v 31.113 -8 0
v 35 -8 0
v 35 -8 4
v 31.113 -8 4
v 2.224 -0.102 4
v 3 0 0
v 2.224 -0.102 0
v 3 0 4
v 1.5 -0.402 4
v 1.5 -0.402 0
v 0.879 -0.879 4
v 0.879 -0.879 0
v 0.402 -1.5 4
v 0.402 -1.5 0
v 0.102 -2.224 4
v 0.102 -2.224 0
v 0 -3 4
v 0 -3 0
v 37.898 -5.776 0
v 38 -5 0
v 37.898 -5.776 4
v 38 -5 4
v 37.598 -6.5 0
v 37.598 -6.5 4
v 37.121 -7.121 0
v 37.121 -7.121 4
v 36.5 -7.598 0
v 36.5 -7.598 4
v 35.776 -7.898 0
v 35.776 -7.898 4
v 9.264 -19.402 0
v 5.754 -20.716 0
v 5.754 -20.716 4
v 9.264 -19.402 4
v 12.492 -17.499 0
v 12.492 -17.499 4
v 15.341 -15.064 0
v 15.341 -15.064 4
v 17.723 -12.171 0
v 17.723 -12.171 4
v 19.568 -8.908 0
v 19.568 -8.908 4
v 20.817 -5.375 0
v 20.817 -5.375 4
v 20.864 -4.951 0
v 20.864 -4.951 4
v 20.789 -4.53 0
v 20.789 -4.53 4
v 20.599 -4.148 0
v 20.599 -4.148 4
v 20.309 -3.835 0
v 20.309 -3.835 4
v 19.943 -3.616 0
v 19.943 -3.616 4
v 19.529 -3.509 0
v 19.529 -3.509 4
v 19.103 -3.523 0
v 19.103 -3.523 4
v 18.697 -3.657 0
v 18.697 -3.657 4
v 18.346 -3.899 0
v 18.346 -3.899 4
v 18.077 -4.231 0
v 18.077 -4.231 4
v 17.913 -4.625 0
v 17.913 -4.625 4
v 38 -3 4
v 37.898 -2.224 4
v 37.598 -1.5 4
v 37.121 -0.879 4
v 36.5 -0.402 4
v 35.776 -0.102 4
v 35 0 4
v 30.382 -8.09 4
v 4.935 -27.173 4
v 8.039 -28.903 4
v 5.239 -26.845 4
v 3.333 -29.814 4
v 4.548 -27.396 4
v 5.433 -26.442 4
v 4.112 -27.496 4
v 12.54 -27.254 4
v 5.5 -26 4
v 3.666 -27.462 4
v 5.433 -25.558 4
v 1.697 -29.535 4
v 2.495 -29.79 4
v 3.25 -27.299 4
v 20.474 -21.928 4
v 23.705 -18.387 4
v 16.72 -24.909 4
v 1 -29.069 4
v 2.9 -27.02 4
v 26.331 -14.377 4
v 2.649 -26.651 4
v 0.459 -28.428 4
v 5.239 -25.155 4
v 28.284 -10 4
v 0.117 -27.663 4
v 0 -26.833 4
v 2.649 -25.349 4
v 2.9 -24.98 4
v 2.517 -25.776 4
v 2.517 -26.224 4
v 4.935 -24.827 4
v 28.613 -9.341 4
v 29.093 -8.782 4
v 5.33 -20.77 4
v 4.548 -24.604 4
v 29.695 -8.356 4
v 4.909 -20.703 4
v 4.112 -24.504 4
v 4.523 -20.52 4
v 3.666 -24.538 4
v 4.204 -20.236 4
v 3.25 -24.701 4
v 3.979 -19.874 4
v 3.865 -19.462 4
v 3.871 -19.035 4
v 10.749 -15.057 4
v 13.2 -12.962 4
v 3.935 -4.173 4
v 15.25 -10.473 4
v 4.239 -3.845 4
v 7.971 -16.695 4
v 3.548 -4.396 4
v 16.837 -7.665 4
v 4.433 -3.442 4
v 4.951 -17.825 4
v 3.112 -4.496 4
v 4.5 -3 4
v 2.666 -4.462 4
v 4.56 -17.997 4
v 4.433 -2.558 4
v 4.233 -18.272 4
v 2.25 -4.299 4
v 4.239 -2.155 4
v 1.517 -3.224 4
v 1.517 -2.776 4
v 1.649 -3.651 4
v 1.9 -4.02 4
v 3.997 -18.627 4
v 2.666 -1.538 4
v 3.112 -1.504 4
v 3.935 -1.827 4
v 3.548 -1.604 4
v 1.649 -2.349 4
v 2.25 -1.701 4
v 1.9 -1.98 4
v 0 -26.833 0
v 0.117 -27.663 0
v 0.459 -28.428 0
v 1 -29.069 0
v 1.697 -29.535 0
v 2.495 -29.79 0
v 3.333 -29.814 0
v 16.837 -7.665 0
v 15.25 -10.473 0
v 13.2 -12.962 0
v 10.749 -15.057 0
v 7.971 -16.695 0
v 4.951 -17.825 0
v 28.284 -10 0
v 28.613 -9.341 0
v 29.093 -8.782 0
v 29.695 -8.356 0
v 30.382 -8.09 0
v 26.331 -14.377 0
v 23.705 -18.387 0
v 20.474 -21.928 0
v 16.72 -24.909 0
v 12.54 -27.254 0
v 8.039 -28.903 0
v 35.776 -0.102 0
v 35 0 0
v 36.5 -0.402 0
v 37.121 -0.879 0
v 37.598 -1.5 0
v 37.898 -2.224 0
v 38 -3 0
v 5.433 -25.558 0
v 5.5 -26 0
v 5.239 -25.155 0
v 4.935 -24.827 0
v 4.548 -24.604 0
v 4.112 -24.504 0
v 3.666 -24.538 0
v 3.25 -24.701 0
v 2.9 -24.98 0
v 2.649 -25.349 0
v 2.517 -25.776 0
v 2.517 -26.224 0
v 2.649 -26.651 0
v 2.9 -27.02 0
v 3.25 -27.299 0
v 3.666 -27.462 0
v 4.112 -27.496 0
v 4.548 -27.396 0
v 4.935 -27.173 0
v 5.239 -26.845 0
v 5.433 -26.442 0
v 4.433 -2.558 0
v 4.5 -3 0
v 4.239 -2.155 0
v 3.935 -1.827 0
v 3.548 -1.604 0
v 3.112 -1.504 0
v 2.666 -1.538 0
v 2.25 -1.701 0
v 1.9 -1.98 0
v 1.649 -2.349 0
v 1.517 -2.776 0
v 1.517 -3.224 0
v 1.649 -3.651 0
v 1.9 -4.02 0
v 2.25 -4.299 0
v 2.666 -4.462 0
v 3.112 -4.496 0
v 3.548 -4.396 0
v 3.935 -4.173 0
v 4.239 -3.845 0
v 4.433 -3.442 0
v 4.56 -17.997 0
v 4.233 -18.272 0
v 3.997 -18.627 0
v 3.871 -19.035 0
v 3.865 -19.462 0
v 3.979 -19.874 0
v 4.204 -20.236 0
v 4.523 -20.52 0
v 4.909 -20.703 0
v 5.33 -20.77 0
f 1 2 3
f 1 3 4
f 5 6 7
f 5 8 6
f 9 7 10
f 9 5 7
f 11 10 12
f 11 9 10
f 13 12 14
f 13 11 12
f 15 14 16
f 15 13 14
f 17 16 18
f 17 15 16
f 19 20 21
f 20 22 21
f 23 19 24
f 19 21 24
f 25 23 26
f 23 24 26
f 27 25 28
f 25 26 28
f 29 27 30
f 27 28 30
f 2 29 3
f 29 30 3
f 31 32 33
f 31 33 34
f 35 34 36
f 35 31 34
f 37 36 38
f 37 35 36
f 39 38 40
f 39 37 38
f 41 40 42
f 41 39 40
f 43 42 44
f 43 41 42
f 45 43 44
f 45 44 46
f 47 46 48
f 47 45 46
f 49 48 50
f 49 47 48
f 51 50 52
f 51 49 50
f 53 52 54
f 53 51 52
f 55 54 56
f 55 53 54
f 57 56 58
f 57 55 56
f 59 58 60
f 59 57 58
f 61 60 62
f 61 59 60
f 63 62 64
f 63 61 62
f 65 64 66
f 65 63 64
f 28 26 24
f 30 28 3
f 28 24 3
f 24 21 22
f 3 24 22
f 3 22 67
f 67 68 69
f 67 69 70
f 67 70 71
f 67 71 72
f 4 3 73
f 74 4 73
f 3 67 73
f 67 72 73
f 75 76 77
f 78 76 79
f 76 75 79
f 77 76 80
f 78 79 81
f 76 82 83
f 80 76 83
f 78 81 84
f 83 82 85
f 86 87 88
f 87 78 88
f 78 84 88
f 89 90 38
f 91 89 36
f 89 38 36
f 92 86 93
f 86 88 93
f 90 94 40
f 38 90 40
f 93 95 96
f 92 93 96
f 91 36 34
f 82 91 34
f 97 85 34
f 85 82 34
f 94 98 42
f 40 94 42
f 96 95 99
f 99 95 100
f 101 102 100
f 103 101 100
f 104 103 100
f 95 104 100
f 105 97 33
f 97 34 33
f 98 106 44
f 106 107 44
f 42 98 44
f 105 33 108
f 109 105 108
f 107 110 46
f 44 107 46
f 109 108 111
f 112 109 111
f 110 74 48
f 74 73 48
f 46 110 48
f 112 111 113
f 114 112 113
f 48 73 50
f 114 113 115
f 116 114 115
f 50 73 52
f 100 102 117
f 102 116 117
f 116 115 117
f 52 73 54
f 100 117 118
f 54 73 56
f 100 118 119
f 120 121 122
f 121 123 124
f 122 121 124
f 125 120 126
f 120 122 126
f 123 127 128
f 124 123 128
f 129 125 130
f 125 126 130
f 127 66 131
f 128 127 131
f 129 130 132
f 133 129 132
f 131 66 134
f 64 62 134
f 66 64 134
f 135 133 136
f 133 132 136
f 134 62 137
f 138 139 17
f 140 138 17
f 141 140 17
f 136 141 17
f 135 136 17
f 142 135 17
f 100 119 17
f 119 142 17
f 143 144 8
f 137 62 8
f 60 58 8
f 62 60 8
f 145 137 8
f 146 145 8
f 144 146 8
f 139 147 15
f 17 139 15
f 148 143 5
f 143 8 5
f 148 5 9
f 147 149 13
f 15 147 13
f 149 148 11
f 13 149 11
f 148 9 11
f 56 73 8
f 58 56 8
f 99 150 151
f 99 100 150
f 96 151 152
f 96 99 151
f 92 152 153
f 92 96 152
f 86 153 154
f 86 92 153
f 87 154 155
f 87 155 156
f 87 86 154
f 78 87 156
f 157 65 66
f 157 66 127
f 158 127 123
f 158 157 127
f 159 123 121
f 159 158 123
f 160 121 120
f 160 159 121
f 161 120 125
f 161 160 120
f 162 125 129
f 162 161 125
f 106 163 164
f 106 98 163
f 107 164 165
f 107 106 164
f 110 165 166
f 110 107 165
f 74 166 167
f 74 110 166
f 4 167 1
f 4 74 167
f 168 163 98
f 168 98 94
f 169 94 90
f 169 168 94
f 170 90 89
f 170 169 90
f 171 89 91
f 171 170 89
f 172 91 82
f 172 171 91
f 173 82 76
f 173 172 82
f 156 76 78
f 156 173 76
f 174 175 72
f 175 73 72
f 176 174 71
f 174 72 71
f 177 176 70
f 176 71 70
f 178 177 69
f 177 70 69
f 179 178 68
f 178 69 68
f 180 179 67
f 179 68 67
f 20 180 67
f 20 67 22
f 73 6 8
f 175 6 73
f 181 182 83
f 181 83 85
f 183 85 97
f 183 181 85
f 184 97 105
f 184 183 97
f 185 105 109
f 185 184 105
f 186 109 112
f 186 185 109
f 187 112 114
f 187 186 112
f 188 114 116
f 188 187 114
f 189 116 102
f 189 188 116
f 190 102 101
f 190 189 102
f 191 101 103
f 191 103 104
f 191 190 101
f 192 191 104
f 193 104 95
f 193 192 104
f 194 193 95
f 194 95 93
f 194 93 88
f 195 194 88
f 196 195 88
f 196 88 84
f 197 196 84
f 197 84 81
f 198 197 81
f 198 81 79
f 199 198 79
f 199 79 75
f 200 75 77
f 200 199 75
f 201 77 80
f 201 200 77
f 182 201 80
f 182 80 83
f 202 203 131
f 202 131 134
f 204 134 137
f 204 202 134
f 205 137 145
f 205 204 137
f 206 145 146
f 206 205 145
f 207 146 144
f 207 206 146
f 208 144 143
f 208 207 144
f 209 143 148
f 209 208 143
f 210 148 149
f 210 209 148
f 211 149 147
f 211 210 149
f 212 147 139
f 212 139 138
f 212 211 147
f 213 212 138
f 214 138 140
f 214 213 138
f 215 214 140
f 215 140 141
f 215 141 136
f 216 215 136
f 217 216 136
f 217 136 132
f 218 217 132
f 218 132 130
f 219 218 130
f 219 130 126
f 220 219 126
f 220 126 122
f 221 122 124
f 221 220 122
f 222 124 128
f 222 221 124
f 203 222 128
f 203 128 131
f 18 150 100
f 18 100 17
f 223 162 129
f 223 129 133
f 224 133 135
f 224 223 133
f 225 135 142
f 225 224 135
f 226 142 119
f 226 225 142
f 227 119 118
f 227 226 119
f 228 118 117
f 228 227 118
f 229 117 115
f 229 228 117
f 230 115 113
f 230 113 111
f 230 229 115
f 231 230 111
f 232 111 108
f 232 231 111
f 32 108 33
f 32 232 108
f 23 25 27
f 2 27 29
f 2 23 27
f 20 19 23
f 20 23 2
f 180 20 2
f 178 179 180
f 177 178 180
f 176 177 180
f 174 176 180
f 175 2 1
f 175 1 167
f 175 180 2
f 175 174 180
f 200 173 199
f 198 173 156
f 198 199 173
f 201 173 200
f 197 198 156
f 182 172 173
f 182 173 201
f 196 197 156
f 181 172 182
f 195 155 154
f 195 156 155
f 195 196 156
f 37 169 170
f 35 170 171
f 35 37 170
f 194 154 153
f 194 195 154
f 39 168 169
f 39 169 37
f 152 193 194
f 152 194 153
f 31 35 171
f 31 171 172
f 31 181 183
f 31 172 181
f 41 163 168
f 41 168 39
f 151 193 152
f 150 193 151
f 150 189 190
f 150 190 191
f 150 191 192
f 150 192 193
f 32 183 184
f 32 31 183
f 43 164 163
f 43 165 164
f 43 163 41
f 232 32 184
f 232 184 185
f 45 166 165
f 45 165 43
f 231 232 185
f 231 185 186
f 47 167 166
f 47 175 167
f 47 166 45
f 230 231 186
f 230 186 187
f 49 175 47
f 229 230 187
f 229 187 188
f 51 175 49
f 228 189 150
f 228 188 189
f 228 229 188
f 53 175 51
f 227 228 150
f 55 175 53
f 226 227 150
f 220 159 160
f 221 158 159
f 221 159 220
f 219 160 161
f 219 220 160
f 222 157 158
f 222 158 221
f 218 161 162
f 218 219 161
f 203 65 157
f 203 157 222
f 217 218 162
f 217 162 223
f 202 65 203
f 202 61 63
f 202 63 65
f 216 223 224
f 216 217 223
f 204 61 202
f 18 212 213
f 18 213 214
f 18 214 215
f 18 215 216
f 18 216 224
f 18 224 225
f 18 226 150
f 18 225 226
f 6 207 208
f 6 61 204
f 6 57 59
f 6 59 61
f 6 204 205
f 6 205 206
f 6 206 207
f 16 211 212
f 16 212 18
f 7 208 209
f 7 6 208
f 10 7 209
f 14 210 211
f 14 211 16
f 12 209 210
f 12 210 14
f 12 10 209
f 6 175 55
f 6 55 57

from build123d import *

# Parameters (mm, degrees)
SKETCH1_R           = 1.5
BOSS_EXTRUDE1_DEPTH = 4
FILLET1_R           = 3


with BuildPart() as part:
    # Sketch1 → Boss-Extrude1 (new body)
    with BuildSketch(Plane.XY):
        with BuildLine():
            Line((0, 0), (30, 0))
            Line((30, 0), (38, 0))
            Line((38, 0), (38, -8))
            Line((38, -8), (28.91366459, -8))
            ThreePointArc((28.91366459, -8), (18.165902125, -23.874672773), (0, -30))
            Line((0, -30), (0, 0))
        make_face()
        with Locations((4, -26)):
            Circle(SKETCH1_R, mode=Mode.SUBTRACT)
        with Locations((3, -3)):
            Circle(SKETCH1_R, mode=Mode.SUBTRACT)
        with BuildLine():
            ThreePointArc((4.950906496, -17.825221594), (3.907043109, -19.671934682), (5.753756198, -20.715798069))
            ThreePointArc((5.753756198, -20.715798069), (15.340798069, -15.063529288), (20.817285486, -5.375))
            ThreePointArc((20.817285486, -5.375), (19.739916731, -3.547631245), (17.912547976, -4.625))
            ThreePointArc((17.912547976, -4.625), (13.200221594, -12.961641481), (4.950906496, -17.825221594))
        make_face(mode=Mode.SUBTRACT)
    extrude(amount=BOSS_EXTRUDE1_DEPTH)

    # Fillet1
    fillet1_edges = [part.edges().sort_by_distance(p)[0] for p in [
        (0, 0, 2),
        (38, 0, 2),
        (38, -8, 2),
        (28.91366459, -8, 2),
        (0, -30, 2),
    ]]
    fillet(fillet1_edges, radius=FILLET1_R)


solid = part.part
